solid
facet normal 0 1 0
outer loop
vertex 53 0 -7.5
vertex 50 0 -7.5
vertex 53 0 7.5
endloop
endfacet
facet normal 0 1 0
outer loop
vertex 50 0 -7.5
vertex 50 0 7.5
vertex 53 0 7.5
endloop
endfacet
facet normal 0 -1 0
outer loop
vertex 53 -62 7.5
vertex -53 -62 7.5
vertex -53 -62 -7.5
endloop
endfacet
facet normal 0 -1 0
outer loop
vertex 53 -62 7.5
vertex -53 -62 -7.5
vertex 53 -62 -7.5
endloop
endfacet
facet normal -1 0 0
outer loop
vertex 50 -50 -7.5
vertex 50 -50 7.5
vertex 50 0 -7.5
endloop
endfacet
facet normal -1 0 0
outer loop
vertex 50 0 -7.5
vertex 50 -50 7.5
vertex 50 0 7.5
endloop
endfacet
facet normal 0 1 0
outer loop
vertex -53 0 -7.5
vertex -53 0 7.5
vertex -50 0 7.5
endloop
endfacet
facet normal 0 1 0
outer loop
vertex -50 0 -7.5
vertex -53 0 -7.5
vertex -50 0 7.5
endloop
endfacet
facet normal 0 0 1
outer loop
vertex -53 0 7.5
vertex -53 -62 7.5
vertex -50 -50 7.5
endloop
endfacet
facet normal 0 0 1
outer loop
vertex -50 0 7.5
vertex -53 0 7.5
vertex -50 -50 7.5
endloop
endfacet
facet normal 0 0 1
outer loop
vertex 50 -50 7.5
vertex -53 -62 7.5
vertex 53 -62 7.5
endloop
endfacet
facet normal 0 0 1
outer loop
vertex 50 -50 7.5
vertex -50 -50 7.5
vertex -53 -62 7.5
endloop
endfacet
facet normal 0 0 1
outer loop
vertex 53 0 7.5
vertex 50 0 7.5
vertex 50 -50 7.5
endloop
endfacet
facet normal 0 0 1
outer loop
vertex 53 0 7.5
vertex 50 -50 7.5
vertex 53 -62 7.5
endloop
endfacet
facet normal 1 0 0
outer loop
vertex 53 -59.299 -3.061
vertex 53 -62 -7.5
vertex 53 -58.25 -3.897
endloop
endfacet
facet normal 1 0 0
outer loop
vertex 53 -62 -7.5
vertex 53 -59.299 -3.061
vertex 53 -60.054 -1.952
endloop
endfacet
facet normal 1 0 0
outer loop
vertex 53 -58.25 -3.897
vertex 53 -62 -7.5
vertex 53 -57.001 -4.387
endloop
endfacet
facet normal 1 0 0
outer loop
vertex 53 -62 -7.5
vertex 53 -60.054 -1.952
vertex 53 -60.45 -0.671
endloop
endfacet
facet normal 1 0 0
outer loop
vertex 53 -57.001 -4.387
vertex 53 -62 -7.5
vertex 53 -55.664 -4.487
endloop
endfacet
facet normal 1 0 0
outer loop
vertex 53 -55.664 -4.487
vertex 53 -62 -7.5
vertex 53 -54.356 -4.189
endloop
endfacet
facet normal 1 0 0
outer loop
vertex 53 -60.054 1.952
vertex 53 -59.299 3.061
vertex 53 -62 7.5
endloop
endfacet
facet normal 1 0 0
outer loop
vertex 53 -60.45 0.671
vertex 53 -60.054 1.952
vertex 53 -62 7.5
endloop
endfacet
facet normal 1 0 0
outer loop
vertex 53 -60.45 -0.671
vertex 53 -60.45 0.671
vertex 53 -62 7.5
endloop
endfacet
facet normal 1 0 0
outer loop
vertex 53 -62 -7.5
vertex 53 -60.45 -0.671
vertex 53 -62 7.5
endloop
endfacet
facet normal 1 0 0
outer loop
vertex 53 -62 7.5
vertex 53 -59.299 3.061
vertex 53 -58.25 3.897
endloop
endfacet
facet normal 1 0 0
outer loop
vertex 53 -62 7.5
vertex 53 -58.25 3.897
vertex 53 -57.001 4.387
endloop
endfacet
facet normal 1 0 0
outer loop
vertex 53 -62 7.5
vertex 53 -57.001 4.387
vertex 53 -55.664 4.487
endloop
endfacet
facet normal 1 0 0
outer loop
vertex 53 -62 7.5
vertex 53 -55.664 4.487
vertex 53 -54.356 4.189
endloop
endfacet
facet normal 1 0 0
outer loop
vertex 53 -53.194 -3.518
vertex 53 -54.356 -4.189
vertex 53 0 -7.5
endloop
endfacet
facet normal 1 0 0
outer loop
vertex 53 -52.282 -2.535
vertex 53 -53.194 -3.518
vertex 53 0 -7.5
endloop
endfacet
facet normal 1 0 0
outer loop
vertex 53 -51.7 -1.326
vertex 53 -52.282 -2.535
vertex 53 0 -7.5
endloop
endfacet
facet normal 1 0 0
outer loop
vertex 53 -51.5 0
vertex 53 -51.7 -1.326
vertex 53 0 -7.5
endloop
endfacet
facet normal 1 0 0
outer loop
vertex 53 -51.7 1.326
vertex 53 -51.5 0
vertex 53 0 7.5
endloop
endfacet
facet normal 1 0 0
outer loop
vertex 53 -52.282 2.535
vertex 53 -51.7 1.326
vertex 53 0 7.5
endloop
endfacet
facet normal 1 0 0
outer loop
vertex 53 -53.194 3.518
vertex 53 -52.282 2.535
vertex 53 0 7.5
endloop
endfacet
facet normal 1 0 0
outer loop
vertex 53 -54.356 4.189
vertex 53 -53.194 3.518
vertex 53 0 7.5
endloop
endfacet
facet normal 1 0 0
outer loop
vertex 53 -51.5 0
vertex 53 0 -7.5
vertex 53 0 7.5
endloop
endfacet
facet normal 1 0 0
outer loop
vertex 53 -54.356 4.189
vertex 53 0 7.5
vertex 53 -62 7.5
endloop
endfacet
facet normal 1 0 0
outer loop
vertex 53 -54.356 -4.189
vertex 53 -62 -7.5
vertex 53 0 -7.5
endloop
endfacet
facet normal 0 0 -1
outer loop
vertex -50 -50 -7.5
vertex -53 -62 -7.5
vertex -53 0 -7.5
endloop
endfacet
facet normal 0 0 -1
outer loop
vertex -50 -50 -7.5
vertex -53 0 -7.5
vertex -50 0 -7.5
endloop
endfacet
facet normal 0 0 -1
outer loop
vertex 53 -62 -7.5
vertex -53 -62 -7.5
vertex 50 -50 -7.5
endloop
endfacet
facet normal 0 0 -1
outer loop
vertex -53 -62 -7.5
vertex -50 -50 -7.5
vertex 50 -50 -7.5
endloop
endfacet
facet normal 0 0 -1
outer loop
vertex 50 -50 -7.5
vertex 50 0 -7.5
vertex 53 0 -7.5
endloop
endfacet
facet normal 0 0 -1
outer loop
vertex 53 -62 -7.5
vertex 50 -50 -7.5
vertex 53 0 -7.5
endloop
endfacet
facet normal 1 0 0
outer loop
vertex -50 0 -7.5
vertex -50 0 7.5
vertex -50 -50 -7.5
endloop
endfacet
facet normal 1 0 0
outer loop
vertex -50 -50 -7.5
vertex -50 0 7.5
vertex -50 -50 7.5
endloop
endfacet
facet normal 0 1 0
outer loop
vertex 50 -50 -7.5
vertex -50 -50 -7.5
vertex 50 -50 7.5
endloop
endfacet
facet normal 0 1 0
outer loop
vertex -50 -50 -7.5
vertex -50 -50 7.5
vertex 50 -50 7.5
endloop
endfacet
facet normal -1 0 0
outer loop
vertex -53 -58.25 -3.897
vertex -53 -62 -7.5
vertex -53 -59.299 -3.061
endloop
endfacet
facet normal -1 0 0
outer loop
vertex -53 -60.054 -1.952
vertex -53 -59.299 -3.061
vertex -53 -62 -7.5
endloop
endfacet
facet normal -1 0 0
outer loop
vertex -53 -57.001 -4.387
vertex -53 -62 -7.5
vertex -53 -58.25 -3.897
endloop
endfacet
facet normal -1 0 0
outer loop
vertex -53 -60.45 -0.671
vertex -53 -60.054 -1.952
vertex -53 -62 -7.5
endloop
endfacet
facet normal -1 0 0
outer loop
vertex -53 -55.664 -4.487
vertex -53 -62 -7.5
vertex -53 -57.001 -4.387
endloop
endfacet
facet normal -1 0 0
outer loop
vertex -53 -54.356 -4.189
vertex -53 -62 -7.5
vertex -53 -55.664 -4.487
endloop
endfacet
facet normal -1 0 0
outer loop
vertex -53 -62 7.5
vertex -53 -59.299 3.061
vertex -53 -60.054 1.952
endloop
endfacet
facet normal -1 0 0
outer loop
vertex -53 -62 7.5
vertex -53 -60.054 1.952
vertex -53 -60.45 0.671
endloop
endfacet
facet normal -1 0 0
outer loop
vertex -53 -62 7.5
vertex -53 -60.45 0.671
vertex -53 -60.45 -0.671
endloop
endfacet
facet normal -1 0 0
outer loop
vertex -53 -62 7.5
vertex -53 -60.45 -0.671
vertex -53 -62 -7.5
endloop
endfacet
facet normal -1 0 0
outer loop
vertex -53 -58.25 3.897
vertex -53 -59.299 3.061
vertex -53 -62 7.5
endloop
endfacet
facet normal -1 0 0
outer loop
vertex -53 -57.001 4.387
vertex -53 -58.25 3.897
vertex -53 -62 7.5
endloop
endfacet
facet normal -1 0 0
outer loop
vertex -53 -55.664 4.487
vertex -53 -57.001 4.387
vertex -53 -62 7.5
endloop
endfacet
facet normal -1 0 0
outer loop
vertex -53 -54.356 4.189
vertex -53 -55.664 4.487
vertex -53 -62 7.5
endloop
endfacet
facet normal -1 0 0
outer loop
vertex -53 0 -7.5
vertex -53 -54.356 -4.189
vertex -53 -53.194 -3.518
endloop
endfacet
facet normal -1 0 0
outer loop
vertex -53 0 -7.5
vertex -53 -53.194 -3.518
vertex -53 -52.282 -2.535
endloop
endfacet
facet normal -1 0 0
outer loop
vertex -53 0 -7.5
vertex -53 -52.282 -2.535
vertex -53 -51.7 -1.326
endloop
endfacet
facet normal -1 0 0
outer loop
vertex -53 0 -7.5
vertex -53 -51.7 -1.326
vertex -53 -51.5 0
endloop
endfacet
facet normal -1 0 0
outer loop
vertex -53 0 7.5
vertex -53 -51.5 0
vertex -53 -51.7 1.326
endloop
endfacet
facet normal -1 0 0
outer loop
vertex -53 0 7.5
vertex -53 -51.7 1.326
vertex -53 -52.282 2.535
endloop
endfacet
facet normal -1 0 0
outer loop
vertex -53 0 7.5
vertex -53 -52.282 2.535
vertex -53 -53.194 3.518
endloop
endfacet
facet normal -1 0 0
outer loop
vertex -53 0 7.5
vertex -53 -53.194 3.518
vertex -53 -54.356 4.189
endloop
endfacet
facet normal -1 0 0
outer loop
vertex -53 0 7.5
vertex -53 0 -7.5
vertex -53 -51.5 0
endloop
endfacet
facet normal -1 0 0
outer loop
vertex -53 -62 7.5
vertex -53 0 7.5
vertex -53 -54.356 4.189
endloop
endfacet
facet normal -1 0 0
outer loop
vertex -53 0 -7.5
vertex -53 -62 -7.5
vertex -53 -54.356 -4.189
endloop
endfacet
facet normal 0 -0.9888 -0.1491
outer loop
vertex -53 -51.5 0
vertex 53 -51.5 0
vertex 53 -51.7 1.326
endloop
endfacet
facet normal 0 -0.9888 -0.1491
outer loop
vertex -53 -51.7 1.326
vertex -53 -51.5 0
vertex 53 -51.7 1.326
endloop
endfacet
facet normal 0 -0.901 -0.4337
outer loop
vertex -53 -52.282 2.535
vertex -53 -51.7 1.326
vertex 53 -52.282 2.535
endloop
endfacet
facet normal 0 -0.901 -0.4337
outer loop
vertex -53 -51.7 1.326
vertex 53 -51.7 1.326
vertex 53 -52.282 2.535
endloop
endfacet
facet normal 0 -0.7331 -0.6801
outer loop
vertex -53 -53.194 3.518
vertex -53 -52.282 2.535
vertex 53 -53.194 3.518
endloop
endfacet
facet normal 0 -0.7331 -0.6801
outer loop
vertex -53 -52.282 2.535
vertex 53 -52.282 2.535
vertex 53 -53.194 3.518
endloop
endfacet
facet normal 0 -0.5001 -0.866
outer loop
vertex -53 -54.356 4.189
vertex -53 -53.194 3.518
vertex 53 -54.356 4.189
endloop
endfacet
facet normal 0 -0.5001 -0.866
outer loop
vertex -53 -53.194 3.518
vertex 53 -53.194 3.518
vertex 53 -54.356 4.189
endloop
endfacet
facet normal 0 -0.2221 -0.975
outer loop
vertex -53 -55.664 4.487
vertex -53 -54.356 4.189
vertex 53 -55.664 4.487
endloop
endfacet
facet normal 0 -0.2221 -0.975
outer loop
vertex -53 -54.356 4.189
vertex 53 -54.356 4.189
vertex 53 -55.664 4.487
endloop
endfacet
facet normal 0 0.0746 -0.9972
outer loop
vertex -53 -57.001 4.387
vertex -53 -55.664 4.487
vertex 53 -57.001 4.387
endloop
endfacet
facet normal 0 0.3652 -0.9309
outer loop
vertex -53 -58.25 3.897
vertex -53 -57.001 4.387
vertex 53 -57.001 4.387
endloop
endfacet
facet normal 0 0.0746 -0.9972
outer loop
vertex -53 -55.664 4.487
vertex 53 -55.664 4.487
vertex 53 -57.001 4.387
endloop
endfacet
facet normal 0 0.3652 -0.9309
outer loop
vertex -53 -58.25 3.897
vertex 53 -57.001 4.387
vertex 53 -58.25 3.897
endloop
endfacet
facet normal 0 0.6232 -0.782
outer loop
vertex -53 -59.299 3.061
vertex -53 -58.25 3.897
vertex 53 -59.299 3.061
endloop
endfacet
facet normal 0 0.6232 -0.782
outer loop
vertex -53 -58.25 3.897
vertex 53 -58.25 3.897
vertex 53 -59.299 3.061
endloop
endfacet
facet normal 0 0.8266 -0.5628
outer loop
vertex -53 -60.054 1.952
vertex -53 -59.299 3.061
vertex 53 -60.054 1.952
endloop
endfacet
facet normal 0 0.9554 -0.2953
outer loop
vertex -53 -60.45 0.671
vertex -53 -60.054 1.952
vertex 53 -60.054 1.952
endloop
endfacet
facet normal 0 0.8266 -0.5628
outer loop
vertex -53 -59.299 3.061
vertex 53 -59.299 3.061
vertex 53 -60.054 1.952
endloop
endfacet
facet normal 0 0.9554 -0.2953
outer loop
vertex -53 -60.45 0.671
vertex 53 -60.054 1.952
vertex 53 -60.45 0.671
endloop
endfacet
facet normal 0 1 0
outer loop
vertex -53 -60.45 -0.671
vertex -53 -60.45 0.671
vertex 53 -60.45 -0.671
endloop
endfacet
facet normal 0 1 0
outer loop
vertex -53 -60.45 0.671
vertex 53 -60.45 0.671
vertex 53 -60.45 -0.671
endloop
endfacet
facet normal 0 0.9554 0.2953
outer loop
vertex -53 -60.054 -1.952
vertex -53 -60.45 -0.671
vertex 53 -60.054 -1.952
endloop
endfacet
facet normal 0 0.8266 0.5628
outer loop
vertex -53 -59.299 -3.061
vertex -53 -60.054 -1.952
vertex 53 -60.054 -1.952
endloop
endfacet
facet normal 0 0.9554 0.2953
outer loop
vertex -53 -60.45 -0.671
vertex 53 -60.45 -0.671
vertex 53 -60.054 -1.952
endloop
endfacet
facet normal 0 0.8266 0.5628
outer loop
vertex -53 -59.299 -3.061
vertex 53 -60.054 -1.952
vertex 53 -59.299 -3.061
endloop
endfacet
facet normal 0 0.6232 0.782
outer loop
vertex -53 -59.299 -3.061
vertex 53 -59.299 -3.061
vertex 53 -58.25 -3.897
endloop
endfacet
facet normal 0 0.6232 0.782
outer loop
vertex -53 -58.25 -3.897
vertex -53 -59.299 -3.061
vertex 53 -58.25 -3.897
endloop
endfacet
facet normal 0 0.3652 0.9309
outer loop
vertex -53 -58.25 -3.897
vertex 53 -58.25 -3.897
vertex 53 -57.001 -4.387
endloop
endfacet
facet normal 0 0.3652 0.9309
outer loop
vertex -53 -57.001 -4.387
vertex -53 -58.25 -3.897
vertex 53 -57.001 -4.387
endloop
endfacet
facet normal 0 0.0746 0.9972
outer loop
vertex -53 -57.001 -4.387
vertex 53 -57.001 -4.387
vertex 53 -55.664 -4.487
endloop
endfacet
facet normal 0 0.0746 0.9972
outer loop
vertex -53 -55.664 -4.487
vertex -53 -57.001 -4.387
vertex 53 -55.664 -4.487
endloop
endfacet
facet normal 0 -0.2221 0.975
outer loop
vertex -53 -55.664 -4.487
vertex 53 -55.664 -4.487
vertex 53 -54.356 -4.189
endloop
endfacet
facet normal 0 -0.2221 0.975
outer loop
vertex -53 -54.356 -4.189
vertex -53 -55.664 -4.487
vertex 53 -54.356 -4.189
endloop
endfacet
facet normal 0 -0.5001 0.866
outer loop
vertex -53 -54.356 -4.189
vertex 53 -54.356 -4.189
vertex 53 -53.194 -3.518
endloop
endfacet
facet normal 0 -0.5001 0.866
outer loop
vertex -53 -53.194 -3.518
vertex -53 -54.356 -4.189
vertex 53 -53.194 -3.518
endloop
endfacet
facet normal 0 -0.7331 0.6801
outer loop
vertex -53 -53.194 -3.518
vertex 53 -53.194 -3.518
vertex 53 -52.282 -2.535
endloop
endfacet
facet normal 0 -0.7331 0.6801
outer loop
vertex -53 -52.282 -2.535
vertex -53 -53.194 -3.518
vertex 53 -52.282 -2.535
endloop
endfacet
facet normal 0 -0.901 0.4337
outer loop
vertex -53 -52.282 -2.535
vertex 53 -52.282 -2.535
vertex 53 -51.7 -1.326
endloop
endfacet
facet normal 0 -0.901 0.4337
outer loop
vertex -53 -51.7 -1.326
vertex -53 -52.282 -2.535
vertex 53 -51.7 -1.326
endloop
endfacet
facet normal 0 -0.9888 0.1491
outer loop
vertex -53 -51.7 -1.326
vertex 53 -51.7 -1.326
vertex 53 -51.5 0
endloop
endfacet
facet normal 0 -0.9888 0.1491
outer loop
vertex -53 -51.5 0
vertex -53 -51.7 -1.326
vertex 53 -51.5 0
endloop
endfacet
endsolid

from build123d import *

# Parameters (mm, degrees)
EXTRUDE_THIN1_DEPTH = 7.5
SKETCH4_W           = 106
SKETCH4_H           = 15
BOSS_EXTRUDE1_DEPTH = 9
SKETCH5_R           = 4.5
CUT_EXTRUDE1_DEPTH  = 124.029468015


with BuildPart() as part:
    # Sketch1 → Extrude-Thin1 (new, symmetric)
    with BuildSketch(Plane.XY):
        Polygon((-50, 0), (-50, -50), (50, -50), (50, 0), (53, 0), (53, -53), (-53, -53), (-53, 0), align=None)
    extrude(amount=EXTRUDE_THIN1_DEPTH, both=True)

    # Sketch4 → Boss-Extrude1 (add)
    with BuildSketch(Plane.XZ.offset(53)):
        Rectangle(SKETCH4_W, SKETCH4_H)
    extrude(amount=BOSS_EXTRUDE1_DEPTH)

    # Sketch5 → Cut-Extrude1 (cut, through all)
    with BuildSketch(Plane(origin=(53, 0, 0), x_dir=(0, 0, -1), z_dir=(1, 0, 0))):
        with Locations(Location((0, -56, 0), (0, 0, 90))):
            Circle(SKETCH5_R)
    extrude(amount=-CUT_EXTRUDE1_DEPTH, mode=Mode.SUBTRACT)


solid = part.part
